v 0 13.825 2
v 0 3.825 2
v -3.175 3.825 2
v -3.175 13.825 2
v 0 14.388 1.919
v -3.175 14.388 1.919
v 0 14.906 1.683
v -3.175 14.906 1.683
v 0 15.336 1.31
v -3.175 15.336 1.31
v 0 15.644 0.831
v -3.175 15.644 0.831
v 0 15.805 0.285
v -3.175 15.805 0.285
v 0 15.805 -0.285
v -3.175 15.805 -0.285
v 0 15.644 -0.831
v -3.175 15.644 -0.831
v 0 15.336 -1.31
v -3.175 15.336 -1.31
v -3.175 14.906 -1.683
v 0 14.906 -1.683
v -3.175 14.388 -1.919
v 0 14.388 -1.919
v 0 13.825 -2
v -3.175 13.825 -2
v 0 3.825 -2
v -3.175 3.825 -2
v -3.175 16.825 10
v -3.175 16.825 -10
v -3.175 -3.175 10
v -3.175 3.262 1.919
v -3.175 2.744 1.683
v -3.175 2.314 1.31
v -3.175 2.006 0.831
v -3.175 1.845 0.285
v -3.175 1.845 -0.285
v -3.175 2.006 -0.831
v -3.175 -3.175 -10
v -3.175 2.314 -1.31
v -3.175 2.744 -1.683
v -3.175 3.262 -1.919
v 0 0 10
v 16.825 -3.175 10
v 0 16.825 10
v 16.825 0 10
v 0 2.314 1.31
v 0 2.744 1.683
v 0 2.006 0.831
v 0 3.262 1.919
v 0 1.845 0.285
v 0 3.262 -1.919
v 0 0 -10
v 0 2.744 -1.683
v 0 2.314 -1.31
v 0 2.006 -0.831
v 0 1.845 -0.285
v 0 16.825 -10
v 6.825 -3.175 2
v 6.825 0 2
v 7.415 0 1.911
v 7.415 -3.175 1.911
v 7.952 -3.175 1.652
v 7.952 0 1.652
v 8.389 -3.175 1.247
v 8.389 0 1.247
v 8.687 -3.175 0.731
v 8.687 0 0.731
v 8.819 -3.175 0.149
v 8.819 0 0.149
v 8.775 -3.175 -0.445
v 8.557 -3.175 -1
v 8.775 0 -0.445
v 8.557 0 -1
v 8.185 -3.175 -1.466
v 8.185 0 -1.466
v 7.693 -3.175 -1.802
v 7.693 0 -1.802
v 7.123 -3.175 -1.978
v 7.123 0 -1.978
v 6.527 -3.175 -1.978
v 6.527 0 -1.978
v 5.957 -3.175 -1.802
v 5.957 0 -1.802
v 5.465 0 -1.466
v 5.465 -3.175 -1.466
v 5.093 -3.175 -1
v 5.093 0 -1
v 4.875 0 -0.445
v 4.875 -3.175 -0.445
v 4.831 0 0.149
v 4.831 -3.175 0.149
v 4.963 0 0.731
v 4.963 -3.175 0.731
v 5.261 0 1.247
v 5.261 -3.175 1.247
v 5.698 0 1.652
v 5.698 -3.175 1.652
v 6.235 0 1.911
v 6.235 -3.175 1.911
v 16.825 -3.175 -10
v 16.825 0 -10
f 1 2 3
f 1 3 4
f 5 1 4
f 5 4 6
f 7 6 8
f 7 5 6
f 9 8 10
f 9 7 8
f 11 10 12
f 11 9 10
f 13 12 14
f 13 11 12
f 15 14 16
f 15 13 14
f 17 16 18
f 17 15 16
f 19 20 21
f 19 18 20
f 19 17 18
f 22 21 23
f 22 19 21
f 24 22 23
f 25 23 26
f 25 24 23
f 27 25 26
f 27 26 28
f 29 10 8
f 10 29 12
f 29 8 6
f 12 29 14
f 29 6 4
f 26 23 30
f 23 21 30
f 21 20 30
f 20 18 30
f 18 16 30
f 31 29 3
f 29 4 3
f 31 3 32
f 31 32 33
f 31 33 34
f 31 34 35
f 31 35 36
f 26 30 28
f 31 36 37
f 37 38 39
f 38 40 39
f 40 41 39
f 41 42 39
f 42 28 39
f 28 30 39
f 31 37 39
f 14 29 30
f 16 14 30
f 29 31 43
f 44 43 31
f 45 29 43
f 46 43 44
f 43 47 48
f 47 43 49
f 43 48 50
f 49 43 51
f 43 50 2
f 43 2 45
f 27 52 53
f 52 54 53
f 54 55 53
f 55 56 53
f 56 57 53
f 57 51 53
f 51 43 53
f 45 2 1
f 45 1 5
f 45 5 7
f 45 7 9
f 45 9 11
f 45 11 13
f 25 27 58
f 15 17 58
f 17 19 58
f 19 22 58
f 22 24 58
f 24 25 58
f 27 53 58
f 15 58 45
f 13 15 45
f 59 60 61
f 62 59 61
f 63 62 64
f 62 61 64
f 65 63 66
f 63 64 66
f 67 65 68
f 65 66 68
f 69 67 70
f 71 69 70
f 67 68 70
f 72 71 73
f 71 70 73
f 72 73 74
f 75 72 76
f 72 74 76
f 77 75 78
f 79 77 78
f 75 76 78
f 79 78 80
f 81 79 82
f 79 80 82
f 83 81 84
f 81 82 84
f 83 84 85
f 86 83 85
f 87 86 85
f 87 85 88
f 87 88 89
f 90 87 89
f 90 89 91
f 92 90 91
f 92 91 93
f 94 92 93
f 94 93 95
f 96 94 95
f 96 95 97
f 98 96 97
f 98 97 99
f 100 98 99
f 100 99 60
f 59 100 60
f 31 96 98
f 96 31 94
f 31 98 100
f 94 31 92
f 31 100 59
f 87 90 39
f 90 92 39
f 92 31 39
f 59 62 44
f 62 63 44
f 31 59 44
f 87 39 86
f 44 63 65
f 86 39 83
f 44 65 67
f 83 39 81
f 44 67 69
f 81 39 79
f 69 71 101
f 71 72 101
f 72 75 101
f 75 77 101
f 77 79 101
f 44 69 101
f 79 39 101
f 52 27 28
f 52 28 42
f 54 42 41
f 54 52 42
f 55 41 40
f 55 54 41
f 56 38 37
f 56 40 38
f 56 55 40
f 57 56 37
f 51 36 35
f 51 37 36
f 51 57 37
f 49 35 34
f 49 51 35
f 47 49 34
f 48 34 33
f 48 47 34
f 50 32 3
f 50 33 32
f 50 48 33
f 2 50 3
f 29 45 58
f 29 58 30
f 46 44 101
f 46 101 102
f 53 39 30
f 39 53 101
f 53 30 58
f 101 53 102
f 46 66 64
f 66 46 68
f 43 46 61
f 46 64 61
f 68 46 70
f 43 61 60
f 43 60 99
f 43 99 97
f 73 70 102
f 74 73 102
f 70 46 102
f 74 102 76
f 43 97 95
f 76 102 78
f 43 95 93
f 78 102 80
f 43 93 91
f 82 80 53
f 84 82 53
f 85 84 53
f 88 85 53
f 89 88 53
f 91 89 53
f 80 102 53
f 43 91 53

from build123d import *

# Parameters (mm, degrees)
BOSS_EXTRUDE1_DEPTH      = 10
BOSS_EXTRUDE1_DEPTH_BACK = 10
SKETCH2_R                = 2
CUT_EXTRUDE1_DEPTH       = 10
CUT_EXTRUDE2_DEPTH       = 10


with BuildPart() as part:
    # Sketch1 → Boss-Extrude1 (new, two sides: drawn at the far end of the back side and taken through both)
    with BuildSketch(Plane.XY.offset(-BOSS_EXTRUDE1_DEPTH_BACK)):
        Polygon((0, 0), (0, 16.825), (-3.175, 16.825), (-3.175, -3.175), (16.825, -3.175), (16.825, 0), align=None)
    extrude(amount=BOSS_EXTRUDE1_DEPTH + BOSS_EXTRUDE1_DEPTH_BACK)

    # Sketch2 → Cut-Extrude1 (cut)
    with BuildSketch(Plane(origin=(0, 0, 0), x_dir=(1, 0, 0), z_dir=(0, 1, 0))):
        with Locations((6.825, 0)):
            Circle(SKETCH2_R)
    extrude(amount=-CUT_EXTRUDE1_DEPTH, mode=Mode.SUBTRACT)

    # Sketch3 → Cut-Extrude2 (cut)
    with BuildSketch(Plane(origin=(0, 0, 0), x_dir=(0, 0, -1), z_dir=(1, 0, 0))):
        with BuildLine():
            Line((2, 13.825), (2, 3.825))
            ThreePointArc((2, 3.825), (0, 1.825), (-2, 3.825))
            Line((-2, 3.825), (-2, 13.825))
            ThreePointArc((-2, 13.825), (0, 15.825), (2, 13.825))
        make_face()
    extrude(amount=-CUT_EXTRUDE2_DEPTH, mode=Mode.SUBTRACT)


solid = part.part
